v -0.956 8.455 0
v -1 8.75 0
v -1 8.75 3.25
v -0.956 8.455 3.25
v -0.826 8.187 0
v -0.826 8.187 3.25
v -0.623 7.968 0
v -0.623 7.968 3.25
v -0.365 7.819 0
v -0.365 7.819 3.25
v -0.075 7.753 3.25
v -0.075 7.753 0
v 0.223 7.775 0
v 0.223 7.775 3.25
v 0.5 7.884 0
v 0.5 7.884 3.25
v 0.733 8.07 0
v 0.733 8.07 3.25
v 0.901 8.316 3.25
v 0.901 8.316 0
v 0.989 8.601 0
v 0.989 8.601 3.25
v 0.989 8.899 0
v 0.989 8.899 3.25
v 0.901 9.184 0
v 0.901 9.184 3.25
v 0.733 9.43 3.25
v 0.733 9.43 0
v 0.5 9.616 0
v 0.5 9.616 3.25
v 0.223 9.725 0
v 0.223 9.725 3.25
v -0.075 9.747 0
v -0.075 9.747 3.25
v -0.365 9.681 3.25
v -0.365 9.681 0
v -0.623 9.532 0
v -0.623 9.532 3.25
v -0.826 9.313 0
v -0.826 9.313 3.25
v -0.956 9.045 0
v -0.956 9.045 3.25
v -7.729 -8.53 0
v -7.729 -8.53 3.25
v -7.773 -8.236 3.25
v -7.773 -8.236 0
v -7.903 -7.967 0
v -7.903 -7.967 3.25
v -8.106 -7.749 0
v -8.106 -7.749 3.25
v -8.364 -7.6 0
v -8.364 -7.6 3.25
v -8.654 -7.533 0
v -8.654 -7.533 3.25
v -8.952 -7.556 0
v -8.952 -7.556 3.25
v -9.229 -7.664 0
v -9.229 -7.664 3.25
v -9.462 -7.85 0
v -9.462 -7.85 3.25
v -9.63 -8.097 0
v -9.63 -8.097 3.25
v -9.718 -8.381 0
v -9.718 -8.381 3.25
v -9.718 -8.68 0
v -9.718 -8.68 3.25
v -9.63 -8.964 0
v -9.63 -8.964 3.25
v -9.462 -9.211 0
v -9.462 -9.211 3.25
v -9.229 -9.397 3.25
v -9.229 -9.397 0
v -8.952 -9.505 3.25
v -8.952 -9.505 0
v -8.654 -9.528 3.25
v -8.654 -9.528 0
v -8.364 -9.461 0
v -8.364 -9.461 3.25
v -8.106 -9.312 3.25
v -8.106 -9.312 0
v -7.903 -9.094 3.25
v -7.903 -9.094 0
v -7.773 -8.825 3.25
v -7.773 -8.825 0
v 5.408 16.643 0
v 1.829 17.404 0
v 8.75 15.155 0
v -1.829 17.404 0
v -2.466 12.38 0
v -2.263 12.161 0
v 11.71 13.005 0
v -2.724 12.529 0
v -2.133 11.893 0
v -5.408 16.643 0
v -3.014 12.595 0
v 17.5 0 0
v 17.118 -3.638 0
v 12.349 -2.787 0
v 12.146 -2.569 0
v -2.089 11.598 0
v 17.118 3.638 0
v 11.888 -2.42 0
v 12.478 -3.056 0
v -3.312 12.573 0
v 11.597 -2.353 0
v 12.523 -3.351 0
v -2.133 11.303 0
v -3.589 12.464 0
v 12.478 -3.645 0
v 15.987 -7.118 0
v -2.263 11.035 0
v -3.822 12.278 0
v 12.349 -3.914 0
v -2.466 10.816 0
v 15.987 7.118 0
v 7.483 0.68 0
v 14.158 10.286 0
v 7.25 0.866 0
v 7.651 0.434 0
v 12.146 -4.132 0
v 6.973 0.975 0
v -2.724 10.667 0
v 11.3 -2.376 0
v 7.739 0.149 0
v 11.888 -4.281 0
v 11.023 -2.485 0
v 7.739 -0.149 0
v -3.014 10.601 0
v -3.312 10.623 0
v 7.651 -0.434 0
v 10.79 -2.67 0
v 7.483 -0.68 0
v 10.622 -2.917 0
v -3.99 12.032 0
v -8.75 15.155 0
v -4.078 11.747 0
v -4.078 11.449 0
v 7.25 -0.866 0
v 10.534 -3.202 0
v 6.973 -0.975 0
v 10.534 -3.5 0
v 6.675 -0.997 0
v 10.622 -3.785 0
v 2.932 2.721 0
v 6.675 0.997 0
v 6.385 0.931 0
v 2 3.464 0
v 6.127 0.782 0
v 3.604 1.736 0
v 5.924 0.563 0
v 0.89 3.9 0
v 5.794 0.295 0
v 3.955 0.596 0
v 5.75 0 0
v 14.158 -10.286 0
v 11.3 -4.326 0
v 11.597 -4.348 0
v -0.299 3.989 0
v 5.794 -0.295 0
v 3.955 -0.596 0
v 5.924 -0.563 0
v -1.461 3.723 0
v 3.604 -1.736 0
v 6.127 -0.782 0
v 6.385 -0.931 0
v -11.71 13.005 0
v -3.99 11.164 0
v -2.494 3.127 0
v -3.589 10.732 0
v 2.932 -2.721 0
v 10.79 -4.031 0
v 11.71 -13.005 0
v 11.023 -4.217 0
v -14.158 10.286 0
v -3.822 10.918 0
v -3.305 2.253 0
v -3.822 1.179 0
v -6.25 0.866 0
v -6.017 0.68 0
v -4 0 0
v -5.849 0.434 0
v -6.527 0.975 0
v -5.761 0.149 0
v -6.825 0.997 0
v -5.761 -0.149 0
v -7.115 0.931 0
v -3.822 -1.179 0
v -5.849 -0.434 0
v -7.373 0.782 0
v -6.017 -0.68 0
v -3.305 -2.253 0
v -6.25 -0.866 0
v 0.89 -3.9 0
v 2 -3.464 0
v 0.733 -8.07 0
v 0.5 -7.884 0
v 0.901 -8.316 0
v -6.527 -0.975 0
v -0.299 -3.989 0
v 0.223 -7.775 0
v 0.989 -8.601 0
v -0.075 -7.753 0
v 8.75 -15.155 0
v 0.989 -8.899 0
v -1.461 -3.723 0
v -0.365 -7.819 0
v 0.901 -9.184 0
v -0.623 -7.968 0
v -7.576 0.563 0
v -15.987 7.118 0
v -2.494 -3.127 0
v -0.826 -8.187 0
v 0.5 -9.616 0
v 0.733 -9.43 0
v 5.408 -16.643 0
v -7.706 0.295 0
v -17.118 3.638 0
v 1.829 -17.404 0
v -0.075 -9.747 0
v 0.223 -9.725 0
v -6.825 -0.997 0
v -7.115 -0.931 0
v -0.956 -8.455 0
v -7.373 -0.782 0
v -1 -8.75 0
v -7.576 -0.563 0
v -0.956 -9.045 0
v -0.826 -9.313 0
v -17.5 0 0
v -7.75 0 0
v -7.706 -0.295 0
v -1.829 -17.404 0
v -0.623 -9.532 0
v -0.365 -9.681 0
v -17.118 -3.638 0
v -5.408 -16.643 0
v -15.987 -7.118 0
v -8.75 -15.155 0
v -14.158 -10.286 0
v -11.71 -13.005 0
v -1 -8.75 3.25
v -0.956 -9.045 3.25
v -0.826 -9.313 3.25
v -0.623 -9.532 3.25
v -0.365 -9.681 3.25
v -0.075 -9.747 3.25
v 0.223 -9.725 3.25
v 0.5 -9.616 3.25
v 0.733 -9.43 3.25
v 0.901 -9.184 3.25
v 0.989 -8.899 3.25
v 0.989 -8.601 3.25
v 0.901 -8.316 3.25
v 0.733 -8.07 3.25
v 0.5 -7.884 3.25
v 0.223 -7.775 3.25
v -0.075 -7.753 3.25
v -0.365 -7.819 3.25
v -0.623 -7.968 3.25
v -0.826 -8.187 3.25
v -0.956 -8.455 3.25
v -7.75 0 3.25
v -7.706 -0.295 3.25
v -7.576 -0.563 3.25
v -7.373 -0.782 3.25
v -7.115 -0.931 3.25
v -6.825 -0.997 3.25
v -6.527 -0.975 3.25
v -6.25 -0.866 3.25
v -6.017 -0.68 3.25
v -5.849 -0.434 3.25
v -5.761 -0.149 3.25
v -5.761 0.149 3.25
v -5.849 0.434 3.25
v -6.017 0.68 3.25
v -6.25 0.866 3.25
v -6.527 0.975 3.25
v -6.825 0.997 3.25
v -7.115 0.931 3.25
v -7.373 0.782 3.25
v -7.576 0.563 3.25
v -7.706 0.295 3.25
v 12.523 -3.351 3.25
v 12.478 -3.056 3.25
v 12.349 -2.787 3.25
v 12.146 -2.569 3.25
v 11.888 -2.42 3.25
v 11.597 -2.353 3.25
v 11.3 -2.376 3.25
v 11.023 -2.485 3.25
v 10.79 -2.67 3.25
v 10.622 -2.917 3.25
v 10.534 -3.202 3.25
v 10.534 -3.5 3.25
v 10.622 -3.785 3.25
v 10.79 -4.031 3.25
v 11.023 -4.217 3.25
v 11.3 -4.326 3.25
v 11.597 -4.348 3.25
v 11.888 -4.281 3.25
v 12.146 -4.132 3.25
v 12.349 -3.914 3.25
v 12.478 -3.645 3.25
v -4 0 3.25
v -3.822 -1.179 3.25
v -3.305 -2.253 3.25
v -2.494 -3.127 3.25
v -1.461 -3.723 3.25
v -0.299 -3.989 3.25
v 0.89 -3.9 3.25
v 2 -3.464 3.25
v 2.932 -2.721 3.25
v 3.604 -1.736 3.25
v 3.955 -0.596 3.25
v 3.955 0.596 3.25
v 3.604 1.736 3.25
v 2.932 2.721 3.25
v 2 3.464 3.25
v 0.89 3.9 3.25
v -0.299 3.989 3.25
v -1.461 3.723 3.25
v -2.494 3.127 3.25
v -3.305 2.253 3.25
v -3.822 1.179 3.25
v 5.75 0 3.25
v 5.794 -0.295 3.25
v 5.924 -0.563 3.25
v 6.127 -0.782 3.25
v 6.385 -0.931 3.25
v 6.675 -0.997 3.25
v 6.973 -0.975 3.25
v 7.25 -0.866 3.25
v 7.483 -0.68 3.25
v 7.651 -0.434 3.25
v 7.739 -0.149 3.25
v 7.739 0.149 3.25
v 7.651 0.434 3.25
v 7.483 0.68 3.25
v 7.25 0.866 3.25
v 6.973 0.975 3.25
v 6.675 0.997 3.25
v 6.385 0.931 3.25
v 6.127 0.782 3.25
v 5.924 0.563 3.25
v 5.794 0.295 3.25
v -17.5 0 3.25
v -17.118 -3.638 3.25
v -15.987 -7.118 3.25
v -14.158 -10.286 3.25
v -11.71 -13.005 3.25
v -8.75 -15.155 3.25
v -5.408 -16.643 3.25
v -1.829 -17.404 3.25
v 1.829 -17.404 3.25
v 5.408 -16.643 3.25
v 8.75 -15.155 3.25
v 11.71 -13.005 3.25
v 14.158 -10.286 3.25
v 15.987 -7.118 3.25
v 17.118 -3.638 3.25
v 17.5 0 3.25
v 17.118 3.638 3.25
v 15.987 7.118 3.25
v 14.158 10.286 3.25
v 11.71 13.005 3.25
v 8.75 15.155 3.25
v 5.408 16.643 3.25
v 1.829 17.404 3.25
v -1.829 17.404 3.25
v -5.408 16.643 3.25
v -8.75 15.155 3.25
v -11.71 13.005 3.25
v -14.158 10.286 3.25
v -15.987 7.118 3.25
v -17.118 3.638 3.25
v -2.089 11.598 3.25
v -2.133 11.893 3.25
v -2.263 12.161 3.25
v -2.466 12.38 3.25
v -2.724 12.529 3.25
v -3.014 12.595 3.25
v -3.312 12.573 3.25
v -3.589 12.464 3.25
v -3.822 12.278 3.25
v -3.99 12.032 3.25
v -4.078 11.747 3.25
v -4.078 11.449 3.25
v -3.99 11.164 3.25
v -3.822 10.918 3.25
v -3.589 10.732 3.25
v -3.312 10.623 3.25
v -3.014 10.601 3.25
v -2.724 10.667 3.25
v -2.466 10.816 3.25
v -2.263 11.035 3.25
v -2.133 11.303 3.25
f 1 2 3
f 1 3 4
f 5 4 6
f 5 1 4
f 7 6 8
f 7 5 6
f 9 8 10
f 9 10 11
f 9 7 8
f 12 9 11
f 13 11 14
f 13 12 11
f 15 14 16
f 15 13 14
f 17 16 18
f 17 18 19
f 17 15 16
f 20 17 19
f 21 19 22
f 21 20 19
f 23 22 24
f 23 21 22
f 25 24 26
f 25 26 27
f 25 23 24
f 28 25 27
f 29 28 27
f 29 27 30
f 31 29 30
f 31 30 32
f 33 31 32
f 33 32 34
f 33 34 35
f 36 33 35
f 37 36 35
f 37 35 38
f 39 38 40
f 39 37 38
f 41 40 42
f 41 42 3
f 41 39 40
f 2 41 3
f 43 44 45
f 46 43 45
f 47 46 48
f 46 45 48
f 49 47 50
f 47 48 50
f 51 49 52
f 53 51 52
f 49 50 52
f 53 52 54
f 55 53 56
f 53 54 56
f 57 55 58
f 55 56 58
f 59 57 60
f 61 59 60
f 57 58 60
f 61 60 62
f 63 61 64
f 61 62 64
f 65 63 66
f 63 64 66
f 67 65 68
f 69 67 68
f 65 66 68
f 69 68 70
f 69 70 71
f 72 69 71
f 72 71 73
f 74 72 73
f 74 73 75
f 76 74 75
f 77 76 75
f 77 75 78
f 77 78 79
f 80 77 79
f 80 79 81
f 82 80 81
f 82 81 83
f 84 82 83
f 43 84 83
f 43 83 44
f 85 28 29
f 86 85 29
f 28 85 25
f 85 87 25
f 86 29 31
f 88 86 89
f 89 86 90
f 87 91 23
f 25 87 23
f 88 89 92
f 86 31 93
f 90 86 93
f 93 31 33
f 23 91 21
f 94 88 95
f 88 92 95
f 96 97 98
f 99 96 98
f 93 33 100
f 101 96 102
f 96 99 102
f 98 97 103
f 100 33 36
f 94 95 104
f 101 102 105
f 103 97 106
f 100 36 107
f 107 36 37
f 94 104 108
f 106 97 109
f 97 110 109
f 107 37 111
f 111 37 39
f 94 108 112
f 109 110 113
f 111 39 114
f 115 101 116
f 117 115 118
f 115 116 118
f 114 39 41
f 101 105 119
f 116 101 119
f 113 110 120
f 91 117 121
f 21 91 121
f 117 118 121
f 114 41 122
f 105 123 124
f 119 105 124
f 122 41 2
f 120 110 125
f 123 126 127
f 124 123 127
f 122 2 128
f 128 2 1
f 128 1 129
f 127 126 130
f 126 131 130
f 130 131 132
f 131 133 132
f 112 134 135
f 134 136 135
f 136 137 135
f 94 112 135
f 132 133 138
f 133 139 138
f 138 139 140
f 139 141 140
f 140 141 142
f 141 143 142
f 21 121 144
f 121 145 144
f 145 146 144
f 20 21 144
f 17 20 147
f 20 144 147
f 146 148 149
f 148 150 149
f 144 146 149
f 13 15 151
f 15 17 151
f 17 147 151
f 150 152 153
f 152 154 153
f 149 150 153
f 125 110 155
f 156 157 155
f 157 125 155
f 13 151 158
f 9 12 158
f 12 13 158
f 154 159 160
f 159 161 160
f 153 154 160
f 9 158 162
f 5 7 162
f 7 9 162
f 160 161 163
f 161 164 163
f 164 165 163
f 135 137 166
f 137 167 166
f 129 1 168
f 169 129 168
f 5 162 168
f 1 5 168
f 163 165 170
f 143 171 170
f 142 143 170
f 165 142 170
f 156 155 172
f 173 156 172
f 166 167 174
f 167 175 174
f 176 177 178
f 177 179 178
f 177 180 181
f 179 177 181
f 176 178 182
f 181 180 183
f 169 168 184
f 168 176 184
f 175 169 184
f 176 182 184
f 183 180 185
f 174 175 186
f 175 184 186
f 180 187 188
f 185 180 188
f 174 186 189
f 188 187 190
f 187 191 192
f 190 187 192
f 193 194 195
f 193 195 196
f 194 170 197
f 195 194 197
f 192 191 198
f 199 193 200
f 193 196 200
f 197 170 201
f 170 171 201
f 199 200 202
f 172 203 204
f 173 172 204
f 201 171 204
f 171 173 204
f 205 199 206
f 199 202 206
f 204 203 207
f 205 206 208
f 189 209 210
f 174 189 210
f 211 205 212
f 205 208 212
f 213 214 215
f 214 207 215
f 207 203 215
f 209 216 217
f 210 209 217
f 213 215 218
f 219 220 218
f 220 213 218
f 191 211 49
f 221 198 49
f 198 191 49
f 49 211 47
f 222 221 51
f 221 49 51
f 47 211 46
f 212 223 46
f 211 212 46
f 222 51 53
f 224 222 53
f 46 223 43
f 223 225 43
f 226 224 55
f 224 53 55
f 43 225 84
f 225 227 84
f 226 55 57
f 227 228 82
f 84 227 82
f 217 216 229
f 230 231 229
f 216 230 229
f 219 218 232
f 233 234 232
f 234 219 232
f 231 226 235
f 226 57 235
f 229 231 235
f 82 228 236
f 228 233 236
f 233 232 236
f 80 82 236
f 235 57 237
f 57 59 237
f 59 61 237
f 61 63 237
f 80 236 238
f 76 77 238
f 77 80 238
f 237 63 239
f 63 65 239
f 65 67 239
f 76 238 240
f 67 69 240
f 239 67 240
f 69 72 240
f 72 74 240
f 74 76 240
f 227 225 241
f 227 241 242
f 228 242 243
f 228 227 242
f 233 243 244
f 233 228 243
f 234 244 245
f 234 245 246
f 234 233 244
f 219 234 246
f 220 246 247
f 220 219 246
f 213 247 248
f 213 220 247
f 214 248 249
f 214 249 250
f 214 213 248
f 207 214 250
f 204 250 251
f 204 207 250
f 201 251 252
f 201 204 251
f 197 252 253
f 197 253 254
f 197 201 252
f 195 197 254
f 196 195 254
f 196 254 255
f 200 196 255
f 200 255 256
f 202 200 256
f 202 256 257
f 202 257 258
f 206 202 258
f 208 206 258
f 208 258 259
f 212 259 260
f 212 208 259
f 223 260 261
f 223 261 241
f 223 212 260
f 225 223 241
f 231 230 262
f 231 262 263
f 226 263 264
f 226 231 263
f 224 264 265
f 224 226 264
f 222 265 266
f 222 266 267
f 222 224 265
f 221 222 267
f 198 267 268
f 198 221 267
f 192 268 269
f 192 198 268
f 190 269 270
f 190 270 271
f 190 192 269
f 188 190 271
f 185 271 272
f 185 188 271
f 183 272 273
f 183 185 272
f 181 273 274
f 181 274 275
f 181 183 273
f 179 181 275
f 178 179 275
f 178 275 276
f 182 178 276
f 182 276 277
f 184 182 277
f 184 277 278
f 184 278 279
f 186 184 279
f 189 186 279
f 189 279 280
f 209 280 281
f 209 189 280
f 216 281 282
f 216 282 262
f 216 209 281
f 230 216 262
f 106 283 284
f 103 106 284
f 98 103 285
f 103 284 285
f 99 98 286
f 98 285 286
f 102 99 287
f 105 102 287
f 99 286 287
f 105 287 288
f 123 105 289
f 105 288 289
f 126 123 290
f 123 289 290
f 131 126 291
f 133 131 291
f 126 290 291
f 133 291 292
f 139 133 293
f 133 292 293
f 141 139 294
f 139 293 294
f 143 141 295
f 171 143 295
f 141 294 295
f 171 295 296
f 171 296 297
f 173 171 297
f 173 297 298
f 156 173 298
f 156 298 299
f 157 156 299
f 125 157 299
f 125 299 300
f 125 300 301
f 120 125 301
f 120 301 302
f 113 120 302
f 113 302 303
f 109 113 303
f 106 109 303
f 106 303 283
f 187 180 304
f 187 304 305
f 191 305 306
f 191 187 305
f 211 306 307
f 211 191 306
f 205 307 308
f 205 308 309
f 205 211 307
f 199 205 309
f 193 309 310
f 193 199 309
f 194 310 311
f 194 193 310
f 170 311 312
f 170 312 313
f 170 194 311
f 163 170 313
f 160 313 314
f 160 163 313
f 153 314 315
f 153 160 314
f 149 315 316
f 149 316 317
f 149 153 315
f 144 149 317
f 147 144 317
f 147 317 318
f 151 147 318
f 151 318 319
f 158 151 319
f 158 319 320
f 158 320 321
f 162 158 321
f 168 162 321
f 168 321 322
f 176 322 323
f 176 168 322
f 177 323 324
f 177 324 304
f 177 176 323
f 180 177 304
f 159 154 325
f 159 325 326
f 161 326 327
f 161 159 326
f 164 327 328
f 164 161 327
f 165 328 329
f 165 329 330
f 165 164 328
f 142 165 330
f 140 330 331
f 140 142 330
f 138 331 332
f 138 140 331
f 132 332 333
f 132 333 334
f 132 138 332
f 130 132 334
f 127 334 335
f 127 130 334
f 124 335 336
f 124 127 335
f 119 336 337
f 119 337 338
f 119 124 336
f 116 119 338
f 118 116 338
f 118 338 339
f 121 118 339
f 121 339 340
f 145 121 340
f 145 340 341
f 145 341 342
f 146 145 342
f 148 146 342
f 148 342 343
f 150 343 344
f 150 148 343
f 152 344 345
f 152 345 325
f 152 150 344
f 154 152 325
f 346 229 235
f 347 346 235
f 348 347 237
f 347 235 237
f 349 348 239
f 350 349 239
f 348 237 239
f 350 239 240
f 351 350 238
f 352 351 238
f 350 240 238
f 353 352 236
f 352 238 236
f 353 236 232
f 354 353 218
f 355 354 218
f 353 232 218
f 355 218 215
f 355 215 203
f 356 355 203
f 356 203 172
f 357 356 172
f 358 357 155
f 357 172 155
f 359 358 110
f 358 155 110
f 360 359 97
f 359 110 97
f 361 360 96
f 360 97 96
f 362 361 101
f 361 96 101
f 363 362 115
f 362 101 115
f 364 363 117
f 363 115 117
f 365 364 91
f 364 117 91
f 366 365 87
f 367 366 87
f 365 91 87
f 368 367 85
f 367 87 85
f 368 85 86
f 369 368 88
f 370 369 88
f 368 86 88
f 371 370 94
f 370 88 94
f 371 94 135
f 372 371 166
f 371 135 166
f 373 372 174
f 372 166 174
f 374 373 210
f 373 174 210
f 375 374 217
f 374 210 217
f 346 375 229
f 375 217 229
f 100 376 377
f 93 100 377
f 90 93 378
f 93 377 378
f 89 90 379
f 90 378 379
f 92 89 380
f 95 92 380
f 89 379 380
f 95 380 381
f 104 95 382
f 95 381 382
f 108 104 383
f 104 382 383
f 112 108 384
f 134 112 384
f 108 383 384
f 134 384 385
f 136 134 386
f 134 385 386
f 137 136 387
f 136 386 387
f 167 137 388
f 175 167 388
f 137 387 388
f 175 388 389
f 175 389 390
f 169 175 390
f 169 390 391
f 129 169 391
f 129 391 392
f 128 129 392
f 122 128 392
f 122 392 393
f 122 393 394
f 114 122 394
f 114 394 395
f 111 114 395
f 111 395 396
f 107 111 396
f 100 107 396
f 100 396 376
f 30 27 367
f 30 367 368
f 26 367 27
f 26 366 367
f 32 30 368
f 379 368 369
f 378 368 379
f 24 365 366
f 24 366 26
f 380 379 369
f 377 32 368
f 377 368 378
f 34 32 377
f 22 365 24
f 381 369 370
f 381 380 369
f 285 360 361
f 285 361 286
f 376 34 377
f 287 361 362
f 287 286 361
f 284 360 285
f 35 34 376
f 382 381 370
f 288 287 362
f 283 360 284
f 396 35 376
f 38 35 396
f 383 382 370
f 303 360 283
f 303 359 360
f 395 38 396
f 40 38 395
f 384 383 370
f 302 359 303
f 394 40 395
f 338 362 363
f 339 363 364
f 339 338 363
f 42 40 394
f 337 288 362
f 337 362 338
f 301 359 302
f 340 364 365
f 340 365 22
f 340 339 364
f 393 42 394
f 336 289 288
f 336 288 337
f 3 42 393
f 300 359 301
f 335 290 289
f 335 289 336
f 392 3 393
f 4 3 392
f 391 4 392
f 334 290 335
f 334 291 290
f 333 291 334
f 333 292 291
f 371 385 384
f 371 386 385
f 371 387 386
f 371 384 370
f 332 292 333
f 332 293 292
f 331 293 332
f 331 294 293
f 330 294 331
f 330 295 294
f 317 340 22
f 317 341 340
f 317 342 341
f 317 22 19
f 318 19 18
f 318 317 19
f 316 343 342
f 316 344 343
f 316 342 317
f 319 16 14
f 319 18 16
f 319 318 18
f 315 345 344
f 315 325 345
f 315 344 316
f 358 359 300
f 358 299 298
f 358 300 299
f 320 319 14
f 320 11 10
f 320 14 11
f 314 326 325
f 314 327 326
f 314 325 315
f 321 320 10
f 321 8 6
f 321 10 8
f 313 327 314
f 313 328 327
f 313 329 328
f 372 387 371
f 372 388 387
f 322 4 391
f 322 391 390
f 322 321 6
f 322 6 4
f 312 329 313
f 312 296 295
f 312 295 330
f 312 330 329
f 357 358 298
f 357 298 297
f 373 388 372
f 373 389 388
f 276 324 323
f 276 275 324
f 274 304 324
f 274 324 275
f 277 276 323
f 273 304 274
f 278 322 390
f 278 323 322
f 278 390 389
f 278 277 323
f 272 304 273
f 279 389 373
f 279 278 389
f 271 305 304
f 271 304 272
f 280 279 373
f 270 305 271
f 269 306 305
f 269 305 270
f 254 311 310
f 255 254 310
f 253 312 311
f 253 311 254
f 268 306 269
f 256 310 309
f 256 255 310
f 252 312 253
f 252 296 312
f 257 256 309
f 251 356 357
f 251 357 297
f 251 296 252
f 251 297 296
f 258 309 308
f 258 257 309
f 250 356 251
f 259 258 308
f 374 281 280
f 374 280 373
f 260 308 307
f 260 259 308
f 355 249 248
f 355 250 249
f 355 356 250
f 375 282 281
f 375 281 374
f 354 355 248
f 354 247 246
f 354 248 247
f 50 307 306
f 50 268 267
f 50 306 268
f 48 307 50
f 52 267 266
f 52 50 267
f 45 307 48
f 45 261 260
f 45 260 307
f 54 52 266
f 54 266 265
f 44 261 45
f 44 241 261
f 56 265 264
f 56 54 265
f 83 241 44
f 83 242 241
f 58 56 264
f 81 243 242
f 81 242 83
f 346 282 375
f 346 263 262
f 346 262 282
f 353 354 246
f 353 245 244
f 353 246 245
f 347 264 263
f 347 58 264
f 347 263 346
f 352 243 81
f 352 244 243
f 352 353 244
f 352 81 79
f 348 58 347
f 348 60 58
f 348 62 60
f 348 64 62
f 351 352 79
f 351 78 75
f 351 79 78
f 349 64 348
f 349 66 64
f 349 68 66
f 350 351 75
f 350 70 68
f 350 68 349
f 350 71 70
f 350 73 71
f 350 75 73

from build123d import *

# Parameters (mm, degrees)
SKETCH1_R           = 17.5
SKETCH1_R_2         = 4
SKETCH1_R_3         = 1
BOSS_EXTRUDE1_DEPTH = 3.25
SKETCH2_R           = 1
CUT_EXTRUDE1_DEPTH  = 25.961219922


with BuildPart() as part:
    # Sketch1 → Boss-Extrude1 (new body)
    with BuildSketch(Plane.XY):
        with Locations(Location((0, 0, 0), (0, 0, 180))):
            Circle(SKETCH1_R)
        with Locations(Location((0, 0, 0), (0, 0, 180))):
            Circle(SKETCH1_R_2, mode=Mode.SUBTRACT)
        with Locations(Location((6.75, 0, 0), (0, 0, 180))):
            Circle(SKETCH1_R_3, mode=Mode.SUBTRACT)
        with Locations(Location((0, 8.75, 0), (0, 0, 180))):
            Circle(SKETCH1_R_3, mode=Mode.SUBTRACT)
        with Locations(Location((0, -8.75, 0), (0, 0, 180))):
            Circle(SKETCH1_R_3, mode=Mode.SUBTRACT)
        with Locations(Location((-6.75, 0, 0), (0, 0, 180))):
            Circle(SKETCH1_R_3, mode=Mode.SUBTRACT)
    extrude(amount=BOSS_EXTRUDE1_DEPTH)

    # Sketch2 → Cut-Extrude1 (cut, through all)
    with BuildSketch(Plane.XY.offset(3.25)):
        with Locations((11.522732664, -3.350616653)):
            Circle(SKETCH2_R)
        with Locations((-8.729040356, -8.530488981)):
            Circle(SKETCH2_R)
        with Locations((-3.08905487, 11.59799709)):
            Circle(SKETCH2_R)
    extrude(amount=-CUT_EXTRUDE1_DEPTH, mode=Mode.SUBTRACT)


solid = part.part
